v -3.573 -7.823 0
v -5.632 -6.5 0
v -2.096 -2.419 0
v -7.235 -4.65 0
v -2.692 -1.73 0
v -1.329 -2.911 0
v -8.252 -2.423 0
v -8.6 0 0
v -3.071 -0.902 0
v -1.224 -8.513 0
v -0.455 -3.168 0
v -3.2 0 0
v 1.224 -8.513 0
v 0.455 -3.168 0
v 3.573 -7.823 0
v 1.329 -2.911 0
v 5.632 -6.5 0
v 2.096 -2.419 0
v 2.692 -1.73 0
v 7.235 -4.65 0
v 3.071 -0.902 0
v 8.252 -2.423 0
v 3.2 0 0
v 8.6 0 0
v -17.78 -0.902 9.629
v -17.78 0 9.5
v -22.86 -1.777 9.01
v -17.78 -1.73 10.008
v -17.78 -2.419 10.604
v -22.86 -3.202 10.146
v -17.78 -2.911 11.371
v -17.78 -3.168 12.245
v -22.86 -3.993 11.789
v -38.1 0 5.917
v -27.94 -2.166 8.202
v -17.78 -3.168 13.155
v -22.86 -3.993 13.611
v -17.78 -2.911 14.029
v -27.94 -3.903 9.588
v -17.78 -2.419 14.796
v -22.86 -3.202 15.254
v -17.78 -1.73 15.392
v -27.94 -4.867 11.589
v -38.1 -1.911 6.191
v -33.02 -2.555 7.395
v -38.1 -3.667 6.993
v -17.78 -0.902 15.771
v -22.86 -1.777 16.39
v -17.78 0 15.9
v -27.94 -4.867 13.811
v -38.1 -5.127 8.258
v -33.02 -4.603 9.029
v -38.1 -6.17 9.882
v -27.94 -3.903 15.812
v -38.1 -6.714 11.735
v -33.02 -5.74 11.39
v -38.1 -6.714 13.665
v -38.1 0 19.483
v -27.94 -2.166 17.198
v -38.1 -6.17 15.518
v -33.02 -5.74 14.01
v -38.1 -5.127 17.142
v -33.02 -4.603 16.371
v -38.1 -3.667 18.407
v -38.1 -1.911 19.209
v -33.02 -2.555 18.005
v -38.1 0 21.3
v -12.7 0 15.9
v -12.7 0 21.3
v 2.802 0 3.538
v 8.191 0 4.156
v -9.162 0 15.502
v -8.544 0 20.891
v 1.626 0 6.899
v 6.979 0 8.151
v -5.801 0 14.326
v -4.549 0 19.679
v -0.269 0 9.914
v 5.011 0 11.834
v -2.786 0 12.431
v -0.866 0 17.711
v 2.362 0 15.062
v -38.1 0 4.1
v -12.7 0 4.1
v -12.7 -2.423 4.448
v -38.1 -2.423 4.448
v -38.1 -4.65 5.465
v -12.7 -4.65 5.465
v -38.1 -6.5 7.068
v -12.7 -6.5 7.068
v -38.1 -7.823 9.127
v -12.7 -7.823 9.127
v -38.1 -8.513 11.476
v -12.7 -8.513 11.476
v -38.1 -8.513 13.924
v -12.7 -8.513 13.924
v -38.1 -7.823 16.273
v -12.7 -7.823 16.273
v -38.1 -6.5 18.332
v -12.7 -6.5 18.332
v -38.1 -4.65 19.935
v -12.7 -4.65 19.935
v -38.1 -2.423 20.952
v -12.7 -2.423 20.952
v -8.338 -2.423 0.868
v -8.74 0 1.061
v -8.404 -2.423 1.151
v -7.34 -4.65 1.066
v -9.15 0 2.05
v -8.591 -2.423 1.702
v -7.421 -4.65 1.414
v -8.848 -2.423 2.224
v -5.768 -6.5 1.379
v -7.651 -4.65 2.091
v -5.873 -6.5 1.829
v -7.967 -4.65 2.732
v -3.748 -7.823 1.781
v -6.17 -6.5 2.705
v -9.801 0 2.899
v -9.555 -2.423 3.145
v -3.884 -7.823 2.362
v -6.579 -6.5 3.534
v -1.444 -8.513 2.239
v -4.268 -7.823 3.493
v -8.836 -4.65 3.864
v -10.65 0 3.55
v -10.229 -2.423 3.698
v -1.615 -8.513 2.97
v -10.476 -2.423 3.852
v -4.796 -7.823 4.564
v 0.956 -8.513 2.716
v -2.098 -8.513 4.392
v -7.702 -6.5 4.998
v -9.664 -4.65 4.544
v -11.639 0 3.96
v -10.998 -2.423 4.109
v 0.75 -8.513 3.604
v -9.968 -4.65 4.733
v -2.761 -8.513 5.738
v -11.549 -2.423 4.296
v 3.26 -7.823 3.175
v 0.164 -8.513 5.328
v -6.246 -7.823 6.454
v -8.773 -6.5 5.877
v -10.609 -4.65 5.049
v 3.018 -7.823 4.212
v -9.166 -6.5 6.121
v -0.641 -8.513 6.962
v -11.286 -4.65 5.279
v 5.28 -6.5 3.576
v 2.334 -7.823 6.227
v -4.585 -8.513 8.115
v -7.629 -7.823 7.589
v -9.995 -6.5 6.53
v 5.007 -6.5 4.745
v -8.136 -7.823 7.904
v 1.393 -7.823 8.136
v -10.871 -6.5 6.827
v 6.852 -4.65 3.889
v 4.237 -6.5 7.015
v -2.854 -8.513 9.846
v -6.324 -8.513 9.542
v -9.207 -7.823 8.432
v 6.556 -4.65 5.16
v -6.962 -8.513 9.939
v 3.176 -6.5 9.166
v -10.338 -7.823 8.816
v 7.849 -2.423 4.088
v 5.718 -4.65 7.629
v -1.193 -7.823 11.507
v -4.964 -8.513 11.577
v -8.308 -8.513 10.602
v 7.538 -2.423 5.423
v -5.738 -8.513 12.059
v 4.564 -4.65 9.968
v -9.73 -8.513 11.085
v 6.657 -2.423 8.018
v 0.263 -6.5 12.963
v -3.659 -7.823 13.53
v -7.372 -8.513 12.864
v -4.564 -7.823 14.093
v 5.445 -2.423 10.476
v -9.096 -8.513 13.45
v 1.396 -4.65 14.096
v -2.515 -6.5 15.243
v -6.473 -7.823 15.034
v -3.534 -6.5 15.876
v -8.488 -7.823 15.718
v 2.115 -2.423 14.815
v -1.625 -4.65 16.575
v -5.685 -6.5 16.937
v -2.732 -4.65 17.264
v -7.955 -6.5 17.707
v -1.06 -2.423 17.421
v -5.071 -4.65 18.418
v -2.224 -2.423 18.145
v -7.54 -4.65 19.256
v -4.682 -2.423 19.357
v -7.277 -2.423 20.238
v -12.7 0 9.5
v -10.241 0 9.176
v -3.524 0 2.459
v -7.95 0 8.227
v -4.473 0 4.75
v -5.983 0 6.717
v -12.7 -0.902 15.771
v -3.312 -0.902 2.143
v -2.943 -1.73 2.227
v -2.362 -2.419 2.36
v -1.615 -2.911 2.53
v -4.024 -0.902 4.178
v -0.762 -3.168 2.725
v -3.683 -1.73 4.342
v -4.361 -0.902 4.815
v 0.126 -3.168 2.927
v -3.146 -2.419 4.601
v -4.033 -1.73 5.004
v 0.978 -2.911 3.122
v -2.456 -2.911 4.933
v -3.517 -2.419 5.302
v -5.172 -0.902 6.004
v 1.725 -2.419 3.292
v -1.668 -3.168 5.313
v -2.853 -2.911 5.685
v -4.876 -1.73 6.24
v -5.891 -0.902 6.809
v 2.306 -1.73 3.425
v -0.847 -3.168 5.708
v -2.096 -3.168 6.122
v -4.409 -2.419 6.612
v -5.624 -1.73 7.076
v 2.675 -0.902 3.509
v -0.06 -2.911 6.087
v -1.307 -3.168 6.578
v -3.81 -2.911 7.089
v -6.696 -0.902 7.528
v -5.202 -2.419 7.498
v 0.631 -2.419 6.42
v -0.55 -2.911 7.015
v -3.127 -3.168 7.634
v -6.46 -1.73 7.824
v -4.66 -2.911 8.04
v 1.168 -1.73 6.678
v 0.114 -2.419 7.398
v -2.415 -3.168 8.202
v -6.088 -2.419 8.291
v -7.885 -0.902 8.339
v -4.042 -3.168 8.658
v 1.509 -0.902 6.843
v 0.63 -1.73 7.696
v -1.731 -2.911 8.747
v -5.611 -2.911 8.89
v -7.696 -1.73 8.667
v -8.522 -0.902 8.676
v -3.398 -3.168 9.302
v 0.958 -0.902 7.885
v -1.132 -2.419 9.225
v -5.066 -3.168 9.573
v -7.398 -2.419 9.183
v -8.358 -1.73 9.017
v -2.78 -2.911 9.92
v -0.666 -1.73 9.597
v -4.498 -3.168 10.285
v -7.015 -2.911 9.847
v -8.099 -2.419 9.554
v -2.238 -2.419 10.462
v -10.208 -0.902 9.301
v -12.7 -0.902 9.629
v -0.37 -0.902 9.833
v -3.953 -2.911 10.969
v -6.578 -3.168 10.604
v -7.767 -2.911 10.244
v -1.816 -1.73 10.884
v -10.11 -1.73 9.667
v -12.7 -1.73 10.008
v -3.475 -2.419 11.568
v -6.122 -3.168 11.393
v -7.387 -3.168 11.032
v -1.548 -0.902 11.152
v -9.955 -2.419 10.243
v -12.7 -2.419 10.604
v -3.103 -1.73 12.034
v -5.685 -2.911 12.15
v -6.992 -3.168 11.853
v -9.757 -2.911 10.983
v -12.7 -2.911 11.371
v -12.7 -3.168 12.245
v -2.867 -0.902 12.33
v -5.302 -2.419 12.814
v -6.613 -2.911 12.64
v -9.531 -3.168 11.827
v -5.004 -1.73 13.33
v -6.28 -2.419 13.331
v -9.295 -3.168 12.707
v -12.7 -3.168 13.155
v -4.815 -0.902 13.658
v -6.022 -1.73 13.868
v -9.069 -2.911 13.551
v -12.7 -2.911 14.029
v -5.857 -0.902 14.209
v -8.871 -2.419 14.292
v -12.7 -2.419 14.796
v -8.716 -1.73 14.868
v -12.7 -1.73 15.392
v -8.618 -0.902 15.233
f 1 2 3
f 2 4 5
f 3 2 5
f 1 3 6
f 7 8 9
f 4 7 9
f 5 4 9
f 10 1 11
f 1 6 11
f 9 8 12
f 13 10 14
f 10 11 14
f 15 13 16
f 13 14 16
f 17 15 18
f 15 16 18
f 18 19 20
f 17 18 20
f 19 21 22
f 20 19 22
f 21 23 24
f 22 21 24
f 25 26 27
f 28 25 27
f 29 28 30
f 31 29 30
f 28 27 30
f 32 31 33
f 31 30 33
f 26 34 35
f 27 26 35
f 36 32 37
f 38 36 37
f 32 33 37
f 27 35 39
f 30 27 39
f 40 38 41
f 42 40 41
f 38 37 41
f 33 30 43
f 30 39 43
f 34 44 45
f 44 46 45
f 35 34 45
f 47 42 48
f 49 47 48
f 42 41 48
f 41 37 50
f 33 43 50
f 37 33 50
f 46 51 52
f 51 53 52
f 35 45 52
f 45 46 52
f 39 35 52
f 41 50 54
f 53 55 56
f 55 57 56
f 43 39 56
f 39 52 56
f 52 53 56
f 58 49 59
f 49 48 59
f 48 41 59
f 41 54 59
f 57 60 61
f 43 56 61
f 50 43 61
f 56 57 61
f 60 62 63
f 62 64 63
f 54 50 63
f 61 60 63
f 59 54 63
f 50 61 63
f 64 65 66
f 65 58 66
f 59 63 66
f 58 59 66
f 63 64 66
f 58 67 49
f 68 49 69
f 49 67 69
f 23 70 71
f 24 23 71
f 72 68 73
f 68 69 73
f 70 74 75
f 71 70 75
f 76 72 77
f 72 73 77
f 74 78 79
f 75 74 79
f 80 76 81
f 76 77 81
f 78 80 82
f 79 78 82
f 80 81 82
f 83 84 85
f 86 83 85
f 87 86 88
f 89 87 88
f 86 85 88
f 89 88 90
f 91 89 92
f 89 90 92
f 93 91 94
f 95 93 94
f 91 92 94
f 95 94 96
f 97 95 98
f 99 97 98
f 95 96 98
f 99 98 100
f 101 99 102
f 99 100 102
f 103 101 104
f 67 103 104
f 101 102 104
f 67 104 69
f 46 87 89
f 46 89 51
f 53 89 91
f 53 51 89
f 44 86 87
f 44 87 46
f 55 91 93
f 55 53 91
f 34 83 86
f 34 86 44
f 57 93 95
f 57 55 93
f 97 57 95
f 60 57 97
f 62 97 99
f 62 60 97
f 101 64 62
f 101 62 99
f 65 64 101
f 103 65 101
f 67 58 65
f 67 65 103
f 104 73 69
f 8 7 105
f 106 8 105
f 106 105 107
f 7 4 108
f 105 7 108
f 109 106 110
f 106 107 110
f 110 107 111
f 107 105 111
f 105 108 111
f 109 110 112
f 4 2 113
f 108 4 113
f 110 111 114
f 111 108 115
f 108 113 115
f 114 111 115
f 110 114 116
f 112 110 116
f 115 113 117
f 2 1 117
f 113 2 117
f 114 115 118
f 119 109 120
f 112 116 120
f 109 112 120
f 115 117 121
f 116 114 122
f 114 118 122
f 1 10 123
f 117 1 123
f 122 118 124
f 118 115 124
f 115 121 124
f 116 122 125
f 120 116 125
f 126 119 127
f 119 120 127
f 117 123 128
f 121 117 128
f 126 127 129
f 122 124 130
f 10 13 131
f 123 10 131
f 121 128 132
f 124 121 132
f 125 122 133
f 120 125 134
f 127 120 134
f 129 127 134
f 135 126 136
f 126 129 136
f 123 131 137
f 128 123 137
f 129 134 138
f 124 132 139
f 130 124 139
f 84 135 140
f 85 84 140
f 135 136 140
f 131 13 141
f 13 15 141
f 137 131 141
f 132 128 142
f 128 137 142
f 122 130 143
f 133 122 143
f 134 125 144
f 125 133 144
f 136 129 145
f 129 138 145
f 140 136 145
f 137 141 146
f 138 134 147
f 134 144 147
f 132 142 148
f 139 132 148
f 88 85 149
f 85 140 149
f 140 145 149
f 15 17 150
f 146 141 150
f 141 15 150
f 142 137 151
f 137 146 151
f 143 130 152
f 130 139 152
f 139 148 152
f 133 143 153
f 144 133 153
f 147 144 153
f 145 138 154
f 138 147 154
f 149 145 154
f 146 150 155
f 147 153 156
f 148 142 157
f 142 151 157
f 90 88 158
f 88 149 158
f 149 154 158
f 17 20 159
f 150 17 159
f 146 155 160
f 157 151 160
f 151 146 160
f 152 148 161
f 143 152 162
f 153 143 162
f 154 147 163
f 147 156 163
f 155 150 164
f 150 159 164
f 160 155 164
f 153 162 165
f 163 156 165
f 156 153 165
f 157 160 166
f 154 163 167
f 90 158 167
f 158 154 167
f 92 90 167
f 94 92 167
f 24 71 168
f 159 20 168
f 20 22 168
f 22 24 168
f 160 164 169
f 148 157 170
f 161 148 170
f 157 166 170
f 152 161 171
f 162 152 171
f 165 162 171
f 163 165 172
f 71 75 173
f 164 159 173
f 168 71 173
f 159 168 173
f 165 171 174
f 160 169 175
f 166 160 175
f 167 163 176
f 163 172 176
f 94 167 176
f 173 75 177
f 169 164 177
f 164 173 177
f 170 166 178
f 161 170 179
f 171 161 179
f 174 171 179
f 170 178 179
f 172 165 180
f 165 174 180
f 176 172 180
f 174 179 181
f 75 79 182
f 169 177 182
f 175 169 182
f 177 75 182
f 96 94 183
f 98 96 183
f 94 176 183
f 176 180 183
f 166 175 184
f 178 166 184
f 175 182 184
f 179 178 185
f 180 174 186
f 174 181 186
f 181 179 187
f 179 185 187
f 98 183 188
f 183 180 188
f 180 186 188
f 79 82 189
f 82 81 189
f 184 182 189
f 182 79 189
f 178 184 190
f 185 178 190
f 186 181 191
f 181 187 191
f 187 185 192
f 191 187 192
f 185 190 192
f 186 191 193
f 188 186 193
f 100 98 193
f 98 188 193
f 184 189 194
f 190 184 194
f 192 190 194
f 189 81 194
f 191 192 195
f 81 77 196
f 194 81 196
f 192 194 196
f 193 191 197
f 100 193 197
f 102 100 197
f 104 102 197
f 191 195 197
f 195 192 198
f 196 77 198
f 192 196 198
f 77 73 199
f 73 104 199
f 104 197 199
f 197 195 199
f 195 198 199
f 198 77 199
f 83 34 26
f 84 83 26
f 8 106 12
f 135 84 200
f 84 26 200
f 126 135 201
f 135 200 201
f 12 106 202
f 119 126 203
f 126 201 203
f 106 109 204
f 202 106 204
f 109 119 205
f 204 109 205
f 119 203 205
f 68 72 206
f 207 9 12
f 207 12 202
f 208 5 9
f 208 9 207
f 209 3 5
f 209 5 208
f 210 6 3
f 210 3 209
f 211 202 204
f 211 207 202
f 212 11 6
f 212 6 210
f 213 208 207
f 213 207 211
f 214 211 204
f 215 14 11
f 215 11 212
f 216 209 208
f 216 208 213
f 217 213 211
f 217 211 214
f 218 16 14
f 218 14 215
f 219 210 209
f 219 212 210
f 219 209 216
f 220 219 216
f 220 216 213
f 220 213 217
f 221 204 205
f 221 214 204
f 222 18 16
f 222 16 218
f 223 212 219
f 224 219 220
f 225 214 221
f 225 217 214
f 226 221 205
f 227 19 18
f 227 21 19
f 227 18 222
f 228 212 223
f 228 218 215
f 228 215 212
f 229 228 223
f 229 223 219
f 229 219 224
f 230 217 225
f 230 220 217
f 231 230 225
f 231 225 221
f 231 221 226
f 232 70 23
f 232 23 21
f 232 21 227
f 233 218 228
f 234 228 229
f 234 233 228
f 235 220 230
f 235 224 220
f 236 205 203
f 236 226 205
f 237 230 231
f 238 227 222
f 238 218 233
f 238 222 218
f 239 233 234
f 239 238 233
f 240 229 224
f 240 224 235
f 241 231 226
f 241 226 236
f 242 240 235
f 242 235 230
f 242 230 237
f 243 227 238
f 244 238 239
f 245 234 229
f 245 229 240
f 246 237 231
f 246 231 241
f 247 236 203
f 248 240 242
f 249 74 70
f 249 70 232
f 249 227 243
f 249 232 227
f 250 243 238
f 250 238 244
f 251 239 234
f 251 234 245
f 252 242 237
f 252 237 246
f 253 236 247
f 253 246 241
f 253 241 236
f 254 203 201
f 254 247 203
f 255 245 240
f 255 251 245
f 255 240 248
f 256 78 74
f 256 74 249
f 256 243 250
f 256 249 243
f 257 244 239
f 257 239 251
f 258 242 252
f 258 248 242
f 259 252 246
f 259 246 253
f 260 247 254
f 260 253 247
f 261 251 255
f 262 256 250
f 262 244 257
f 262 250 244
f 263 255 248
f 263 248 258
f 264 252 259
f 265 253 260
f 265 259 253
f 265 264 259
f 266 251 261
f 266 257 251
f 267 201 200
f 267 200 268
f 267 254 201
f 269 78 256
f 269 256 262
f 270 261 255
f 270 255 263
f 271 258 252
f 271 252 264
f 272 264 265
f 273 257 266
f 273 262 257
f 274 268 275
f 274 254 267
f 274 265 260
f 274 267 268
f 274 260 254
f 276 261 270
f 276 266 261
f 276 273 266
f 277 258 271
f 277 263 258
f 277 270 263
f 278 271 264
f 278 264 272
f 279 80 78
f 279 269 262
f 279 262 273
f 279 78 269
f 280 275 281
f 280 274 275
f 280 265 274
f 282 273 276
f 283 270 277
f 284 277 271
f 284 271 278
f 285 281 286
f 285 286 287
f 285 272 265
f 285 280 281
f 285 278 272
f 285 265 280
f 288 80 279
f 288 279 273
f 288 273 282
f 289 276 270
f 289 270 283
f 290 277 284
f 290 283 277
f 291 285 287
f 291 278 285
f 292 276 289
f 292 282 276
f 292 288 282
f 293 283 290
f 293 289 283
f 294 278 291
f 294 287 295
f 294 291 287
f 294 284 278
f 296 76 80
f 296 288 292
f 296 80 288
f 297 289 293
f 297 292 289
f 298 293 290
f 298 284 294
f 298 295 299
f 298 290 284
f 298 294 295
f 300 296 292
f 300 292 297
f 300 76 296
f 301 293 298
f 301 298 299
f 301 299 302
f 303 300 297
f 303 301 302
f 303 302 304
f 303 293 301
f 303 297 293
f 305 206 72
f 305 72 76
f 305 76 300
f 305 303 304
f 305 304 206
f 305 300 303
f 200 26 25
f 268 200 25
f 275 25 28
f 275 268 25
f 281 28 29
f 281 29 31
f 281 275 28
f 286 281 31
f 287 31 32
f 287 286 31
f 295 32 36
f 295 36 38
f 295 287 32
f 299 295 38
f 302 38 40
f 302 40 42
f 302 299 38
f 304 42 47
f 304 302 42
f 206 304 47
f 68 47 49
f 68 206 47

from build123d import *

# Parameters (mm, degrees)
F0_R     = 8.60044
F0_R_2   = 3.2004
F2_ANGLE = 90
F3_DEPTH = 25.4
F4_SIZE2 = 3.582964248
F4_SIZE  = 20.32
F5_W     = 290.7801419497
F5_H     = 55.9114702046
F6_DEPTH = 25.4


with BuildPart() as f2:
    # F0 (on Top) → F2 (revolve)
    with BuildSketch(Plane.XY):
        Circle(F0_R)
        Circle(F0_R_2, mode=Mode.SUBTRACT)
    revolve(axis=Axis((-12.7, -0.6994176656, 0), (0, -1, 0)), revolution_arc=F2_ANGLE)

    # F3 (add): a face of the model
    f3_faces = [f2.faces().sort_by_distance(p)[0] for p in [
        (-12.7, 0, 4.3428171778),
    ]]
    extrude(f3_faces, amount=F3_DEPTH)

    # F4
    f4_edges = [f2.edges().sort_by_distance(p)[0] for p in [
        (-38.1, 0, 9.4996),
    ]]
    f4_side = f2.faces().sort_by_distance((-25.4, 0, 9.4996))[0]
    chamfer(f4_edges, length=F4_SIZE, length2=F4_SIZE2, reference=f4_side)

    # F5 (on Front) → F6 (cut)
    with BuildSketch(Plane.XZ):
        with Locations((-2.42703408, 7.5079593807)):
            Rectangle(F5_W, F5_H)
    extrude(amount=-F6_DEPTH, mode=Mode.SUBTRACT)


solid = f2.part
